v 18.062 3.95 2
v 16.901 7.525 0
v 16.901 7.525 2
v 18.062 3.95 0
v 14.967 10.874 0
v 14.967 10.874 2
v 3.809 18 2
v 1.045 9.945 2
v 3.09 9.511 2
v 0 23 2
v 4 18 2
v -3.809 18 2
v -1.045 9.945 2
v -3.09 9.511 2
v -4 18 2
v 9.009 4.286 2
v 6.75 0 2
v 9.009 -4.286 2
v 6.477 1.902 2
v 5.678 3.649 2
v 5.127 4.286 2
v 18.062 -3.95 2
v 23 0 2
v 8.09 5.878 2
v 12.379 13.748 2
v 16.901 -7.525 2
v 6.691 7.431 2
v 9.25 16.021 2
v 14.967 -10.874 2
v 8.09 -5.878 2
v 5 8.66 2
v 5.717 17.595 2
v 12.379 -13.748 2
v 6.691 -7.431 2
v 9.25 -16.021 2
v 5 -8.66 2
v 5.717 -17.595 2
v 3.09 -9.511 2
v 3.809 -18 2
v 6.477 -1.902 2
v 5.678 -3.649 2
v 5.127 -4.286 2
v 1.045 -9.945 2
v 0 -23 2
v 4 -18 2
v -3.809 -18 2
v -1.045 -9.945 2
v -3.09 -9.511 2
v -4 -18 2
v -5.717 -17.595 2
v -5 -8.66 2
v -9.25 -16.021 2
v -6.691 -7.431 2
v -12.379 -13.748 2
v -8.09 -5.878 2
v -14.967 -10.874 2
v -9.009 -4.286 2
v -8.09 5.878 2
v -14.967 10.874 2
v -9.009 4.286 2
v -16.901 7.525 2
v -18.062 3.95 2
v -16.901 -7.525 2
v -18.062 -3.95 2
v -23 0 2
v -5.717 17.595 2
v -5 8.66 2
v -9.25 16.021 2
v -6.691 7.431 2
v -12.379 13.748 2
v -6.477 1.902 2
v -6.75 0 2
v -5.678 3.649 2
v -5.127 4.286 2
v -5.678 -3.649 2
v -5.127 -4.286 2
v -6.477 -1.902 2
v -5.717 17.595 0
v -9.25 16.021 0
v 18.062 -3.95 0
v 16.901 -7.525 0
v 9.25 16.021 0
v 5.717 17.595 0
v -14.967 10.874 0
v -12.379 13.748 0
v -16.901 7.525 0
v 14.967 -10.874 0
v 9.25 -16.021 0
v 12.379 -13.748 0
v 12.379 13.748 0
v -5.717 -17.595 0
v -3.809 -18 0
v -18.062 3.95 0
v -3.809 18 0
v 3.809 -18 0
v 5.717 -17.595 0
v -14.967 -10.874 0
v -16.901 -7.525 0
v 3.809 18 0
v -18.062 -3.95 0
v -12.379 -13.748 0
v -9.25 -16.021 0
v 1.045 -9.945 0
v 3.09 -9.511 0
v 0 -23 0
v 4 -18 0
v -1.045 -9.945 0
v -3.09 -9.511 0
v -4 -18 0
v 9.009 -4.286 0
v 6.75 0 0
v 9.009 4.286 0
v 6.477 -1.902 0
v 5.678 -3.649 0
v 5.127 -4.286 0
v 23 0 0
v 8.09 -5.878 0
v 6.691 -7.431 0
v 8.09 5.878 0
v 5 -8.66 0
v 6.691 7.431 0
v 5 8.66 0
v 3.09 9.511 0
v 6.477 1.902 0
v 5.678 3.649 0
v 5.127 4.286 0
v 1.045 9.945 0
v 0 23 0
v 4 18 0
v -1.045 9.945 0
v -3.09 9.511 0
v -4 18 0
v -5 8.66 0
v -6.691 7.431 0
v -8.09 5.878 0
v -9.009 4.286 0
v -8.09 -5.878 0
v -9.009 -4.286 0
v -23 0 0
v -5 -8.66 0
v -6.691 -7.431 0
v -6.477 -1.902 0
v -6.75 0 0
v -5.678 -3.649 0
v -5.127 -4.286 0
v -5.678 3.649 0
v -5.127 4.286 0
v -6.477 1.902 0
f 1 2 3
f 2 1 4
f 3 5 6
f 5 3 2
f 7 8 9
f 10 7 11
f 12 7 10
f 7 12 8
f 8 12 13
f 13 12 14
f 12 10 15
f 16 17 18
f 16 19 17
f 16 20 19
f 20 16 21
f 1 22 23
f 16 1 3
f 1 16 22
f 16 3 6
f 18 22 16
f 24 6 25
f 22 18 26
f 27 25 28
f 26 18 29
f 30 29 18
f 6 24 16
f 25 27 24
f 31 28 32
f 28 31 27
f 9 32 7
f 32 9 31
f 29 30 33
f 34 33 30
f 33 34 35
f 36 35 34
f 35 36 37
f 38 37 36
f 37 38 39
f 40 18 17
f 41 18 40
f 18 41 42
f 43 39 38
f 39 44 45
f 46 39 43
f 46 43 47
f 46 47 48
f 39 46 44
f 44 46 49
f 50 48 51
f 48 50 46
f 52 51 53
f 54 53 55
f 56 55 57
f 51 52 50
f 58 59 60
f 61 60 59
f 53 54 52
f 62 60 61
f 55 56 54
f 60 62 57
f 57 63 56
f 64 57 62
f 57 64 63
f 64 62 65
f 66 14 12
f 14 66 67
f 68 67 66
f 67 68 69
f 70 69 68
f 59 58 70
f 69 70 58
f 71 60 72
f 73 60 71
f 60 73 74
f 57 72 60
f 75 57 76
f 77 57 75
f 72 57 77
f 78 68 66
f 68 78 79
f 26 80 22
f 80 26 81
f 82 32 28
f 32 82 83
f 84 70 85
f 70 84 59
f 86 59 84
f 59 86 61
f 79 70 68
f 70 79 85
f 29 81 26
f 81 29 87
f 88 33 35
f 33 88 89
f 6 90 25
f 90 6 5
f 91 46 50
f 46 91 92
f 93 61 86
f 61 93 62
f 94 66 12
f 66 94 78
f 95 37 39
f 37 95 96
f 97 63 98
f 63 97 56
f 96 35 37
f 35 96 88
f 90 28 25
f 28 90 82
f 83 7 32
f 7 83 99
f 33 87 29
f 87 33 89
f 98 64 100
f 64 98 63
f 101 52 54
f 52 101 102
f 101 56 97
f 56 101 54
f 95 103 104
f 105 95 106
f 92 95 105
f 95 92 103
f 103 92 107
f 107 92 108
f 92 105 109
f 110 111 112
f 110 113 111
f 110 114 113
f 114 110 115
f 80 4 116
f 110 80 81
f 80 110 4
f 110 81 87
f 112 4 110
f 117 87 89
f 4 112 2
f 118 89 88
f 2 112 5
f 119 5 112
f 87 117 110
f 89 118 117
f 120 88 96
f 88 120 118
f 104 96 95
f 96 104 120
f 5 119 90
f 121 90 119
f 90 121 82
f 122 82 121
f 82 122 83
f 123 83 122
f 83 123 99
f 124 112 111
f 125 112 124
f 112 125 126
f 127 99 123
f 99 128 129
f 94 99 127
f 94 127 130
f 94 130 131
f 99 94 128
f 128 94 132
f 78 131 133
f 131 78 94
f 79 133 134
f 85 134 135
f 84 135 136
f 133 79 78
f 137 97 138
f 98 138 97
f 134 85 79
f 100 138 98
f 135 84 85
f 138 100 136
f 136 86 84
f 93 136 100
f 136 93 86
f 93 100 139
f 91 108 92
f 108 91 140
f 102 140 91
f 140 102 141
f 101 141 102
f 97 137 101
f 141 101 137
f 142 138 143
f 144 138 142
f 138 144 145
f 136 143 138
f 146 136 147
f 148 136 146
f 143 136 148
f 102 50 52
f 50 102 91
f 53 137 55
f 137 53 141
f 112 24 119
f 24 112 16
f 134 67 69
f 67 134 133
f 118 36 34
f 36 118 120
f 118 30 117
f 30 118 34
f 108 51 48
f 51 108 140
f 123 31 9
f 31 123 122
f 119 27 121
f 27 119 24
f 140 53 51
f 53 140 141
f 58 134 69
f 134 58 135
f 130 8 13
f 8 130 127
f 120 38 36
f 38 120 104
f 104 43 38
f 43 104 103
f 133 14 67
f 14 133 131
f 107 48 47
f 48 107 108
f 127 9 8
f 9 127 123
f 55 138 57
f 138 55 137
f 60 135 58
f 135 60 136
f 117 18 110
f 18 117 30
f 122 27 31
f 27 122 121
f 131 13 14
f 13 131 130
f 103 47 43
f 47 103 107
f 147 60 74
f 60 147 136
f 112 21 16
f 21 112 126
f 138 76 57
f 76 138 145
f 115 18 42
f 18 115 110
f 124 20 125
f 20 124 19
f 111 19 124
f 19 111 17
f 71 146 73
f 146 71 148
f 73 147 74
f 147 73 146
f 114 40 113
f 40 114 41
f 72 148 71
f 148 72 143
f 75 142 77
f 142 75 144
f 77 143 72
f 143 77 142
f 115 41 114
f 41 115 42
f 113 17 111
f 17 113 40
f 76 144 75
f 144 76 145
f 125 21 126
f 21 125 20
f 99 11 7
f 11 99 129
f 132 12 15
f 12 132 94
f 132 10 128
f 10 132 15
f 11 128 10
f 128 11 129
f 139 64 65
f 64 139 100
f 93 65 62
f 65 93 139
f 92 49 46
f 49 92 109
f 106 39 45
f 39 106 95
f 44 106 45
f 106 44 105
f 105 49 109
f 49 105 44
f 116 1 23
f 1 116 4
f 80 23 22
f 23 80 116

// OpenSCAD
// file: attack-ring-base.scad
thickness = 2;
base_diameter = 35;
core_diameter = 15;

module attack_ring_base() {
    clip_length = base_diameter;
    clip_width = core_diameter / 1.75;

    difference() {
        cylinder(thickness, d = base_diameter + thickness);
        cylinder(thickness, d = core_diameter + 5);
    }
    difference() {
        translate([-clip_length / 2, -clip_width / 2])
        cube([clip_length, clip_width, thickness]);
        cylinder(thickness, d = core_diameter - thickness + 0.5);
    }
}

attack_ring_base();
// file: lib/openscad-lib/prism.scad
module prism(points, height) {
    top_points = [ for (p = points) [p[0], p[1], height] ];
    
    points = concat(points, top_points);
    vertices = len(points);
    sides_count = vertices / 2;
    faces = concat(
        [[ for (i = [0:sides_count - 1]) i ]],
        [ for (i = [0:sides_count - 1]) 
            [
                (i + sides_count) % vertices,
                i == sides_count - 1 ? i + 1 : (i + sides_count + 1) % vertices,
                i != sides_count - 1 ? i + 1 : (i + sides_count + 1) % vertices,
                i,
            ]
        ],
        [[ for (i = [vertices - 1:-1:sides_count]) i ]]
    );

    polyhedron(points, faces);
}

module regular_prism(
    sides_count,
    radius = 0,
    sides_length,
    height,
) {
    radius = radius != 0 ? radius : (sides_length / (2 * sin(180 / sides_count)));
    angles = [ for (i = [0:sides_count - 1]) i * (360 / sides_count) ];
    
    base_points = [ for (i = angles) [radius * cos(i), radius * sin(i), 0] ];

    prism(points = base_points, height = height);
}
// main file
use <lib/openscad-lib/prism.scad>
use <attack-ring-base.scad>

attack_ring_base();
for (i = [0:3]) {
    rotate(i * 90)
    translate([0, 18])
    prism(
        [
            [-4, 0],
            [4, 0],
            [0, 5]
        ],
        2
    );
}
